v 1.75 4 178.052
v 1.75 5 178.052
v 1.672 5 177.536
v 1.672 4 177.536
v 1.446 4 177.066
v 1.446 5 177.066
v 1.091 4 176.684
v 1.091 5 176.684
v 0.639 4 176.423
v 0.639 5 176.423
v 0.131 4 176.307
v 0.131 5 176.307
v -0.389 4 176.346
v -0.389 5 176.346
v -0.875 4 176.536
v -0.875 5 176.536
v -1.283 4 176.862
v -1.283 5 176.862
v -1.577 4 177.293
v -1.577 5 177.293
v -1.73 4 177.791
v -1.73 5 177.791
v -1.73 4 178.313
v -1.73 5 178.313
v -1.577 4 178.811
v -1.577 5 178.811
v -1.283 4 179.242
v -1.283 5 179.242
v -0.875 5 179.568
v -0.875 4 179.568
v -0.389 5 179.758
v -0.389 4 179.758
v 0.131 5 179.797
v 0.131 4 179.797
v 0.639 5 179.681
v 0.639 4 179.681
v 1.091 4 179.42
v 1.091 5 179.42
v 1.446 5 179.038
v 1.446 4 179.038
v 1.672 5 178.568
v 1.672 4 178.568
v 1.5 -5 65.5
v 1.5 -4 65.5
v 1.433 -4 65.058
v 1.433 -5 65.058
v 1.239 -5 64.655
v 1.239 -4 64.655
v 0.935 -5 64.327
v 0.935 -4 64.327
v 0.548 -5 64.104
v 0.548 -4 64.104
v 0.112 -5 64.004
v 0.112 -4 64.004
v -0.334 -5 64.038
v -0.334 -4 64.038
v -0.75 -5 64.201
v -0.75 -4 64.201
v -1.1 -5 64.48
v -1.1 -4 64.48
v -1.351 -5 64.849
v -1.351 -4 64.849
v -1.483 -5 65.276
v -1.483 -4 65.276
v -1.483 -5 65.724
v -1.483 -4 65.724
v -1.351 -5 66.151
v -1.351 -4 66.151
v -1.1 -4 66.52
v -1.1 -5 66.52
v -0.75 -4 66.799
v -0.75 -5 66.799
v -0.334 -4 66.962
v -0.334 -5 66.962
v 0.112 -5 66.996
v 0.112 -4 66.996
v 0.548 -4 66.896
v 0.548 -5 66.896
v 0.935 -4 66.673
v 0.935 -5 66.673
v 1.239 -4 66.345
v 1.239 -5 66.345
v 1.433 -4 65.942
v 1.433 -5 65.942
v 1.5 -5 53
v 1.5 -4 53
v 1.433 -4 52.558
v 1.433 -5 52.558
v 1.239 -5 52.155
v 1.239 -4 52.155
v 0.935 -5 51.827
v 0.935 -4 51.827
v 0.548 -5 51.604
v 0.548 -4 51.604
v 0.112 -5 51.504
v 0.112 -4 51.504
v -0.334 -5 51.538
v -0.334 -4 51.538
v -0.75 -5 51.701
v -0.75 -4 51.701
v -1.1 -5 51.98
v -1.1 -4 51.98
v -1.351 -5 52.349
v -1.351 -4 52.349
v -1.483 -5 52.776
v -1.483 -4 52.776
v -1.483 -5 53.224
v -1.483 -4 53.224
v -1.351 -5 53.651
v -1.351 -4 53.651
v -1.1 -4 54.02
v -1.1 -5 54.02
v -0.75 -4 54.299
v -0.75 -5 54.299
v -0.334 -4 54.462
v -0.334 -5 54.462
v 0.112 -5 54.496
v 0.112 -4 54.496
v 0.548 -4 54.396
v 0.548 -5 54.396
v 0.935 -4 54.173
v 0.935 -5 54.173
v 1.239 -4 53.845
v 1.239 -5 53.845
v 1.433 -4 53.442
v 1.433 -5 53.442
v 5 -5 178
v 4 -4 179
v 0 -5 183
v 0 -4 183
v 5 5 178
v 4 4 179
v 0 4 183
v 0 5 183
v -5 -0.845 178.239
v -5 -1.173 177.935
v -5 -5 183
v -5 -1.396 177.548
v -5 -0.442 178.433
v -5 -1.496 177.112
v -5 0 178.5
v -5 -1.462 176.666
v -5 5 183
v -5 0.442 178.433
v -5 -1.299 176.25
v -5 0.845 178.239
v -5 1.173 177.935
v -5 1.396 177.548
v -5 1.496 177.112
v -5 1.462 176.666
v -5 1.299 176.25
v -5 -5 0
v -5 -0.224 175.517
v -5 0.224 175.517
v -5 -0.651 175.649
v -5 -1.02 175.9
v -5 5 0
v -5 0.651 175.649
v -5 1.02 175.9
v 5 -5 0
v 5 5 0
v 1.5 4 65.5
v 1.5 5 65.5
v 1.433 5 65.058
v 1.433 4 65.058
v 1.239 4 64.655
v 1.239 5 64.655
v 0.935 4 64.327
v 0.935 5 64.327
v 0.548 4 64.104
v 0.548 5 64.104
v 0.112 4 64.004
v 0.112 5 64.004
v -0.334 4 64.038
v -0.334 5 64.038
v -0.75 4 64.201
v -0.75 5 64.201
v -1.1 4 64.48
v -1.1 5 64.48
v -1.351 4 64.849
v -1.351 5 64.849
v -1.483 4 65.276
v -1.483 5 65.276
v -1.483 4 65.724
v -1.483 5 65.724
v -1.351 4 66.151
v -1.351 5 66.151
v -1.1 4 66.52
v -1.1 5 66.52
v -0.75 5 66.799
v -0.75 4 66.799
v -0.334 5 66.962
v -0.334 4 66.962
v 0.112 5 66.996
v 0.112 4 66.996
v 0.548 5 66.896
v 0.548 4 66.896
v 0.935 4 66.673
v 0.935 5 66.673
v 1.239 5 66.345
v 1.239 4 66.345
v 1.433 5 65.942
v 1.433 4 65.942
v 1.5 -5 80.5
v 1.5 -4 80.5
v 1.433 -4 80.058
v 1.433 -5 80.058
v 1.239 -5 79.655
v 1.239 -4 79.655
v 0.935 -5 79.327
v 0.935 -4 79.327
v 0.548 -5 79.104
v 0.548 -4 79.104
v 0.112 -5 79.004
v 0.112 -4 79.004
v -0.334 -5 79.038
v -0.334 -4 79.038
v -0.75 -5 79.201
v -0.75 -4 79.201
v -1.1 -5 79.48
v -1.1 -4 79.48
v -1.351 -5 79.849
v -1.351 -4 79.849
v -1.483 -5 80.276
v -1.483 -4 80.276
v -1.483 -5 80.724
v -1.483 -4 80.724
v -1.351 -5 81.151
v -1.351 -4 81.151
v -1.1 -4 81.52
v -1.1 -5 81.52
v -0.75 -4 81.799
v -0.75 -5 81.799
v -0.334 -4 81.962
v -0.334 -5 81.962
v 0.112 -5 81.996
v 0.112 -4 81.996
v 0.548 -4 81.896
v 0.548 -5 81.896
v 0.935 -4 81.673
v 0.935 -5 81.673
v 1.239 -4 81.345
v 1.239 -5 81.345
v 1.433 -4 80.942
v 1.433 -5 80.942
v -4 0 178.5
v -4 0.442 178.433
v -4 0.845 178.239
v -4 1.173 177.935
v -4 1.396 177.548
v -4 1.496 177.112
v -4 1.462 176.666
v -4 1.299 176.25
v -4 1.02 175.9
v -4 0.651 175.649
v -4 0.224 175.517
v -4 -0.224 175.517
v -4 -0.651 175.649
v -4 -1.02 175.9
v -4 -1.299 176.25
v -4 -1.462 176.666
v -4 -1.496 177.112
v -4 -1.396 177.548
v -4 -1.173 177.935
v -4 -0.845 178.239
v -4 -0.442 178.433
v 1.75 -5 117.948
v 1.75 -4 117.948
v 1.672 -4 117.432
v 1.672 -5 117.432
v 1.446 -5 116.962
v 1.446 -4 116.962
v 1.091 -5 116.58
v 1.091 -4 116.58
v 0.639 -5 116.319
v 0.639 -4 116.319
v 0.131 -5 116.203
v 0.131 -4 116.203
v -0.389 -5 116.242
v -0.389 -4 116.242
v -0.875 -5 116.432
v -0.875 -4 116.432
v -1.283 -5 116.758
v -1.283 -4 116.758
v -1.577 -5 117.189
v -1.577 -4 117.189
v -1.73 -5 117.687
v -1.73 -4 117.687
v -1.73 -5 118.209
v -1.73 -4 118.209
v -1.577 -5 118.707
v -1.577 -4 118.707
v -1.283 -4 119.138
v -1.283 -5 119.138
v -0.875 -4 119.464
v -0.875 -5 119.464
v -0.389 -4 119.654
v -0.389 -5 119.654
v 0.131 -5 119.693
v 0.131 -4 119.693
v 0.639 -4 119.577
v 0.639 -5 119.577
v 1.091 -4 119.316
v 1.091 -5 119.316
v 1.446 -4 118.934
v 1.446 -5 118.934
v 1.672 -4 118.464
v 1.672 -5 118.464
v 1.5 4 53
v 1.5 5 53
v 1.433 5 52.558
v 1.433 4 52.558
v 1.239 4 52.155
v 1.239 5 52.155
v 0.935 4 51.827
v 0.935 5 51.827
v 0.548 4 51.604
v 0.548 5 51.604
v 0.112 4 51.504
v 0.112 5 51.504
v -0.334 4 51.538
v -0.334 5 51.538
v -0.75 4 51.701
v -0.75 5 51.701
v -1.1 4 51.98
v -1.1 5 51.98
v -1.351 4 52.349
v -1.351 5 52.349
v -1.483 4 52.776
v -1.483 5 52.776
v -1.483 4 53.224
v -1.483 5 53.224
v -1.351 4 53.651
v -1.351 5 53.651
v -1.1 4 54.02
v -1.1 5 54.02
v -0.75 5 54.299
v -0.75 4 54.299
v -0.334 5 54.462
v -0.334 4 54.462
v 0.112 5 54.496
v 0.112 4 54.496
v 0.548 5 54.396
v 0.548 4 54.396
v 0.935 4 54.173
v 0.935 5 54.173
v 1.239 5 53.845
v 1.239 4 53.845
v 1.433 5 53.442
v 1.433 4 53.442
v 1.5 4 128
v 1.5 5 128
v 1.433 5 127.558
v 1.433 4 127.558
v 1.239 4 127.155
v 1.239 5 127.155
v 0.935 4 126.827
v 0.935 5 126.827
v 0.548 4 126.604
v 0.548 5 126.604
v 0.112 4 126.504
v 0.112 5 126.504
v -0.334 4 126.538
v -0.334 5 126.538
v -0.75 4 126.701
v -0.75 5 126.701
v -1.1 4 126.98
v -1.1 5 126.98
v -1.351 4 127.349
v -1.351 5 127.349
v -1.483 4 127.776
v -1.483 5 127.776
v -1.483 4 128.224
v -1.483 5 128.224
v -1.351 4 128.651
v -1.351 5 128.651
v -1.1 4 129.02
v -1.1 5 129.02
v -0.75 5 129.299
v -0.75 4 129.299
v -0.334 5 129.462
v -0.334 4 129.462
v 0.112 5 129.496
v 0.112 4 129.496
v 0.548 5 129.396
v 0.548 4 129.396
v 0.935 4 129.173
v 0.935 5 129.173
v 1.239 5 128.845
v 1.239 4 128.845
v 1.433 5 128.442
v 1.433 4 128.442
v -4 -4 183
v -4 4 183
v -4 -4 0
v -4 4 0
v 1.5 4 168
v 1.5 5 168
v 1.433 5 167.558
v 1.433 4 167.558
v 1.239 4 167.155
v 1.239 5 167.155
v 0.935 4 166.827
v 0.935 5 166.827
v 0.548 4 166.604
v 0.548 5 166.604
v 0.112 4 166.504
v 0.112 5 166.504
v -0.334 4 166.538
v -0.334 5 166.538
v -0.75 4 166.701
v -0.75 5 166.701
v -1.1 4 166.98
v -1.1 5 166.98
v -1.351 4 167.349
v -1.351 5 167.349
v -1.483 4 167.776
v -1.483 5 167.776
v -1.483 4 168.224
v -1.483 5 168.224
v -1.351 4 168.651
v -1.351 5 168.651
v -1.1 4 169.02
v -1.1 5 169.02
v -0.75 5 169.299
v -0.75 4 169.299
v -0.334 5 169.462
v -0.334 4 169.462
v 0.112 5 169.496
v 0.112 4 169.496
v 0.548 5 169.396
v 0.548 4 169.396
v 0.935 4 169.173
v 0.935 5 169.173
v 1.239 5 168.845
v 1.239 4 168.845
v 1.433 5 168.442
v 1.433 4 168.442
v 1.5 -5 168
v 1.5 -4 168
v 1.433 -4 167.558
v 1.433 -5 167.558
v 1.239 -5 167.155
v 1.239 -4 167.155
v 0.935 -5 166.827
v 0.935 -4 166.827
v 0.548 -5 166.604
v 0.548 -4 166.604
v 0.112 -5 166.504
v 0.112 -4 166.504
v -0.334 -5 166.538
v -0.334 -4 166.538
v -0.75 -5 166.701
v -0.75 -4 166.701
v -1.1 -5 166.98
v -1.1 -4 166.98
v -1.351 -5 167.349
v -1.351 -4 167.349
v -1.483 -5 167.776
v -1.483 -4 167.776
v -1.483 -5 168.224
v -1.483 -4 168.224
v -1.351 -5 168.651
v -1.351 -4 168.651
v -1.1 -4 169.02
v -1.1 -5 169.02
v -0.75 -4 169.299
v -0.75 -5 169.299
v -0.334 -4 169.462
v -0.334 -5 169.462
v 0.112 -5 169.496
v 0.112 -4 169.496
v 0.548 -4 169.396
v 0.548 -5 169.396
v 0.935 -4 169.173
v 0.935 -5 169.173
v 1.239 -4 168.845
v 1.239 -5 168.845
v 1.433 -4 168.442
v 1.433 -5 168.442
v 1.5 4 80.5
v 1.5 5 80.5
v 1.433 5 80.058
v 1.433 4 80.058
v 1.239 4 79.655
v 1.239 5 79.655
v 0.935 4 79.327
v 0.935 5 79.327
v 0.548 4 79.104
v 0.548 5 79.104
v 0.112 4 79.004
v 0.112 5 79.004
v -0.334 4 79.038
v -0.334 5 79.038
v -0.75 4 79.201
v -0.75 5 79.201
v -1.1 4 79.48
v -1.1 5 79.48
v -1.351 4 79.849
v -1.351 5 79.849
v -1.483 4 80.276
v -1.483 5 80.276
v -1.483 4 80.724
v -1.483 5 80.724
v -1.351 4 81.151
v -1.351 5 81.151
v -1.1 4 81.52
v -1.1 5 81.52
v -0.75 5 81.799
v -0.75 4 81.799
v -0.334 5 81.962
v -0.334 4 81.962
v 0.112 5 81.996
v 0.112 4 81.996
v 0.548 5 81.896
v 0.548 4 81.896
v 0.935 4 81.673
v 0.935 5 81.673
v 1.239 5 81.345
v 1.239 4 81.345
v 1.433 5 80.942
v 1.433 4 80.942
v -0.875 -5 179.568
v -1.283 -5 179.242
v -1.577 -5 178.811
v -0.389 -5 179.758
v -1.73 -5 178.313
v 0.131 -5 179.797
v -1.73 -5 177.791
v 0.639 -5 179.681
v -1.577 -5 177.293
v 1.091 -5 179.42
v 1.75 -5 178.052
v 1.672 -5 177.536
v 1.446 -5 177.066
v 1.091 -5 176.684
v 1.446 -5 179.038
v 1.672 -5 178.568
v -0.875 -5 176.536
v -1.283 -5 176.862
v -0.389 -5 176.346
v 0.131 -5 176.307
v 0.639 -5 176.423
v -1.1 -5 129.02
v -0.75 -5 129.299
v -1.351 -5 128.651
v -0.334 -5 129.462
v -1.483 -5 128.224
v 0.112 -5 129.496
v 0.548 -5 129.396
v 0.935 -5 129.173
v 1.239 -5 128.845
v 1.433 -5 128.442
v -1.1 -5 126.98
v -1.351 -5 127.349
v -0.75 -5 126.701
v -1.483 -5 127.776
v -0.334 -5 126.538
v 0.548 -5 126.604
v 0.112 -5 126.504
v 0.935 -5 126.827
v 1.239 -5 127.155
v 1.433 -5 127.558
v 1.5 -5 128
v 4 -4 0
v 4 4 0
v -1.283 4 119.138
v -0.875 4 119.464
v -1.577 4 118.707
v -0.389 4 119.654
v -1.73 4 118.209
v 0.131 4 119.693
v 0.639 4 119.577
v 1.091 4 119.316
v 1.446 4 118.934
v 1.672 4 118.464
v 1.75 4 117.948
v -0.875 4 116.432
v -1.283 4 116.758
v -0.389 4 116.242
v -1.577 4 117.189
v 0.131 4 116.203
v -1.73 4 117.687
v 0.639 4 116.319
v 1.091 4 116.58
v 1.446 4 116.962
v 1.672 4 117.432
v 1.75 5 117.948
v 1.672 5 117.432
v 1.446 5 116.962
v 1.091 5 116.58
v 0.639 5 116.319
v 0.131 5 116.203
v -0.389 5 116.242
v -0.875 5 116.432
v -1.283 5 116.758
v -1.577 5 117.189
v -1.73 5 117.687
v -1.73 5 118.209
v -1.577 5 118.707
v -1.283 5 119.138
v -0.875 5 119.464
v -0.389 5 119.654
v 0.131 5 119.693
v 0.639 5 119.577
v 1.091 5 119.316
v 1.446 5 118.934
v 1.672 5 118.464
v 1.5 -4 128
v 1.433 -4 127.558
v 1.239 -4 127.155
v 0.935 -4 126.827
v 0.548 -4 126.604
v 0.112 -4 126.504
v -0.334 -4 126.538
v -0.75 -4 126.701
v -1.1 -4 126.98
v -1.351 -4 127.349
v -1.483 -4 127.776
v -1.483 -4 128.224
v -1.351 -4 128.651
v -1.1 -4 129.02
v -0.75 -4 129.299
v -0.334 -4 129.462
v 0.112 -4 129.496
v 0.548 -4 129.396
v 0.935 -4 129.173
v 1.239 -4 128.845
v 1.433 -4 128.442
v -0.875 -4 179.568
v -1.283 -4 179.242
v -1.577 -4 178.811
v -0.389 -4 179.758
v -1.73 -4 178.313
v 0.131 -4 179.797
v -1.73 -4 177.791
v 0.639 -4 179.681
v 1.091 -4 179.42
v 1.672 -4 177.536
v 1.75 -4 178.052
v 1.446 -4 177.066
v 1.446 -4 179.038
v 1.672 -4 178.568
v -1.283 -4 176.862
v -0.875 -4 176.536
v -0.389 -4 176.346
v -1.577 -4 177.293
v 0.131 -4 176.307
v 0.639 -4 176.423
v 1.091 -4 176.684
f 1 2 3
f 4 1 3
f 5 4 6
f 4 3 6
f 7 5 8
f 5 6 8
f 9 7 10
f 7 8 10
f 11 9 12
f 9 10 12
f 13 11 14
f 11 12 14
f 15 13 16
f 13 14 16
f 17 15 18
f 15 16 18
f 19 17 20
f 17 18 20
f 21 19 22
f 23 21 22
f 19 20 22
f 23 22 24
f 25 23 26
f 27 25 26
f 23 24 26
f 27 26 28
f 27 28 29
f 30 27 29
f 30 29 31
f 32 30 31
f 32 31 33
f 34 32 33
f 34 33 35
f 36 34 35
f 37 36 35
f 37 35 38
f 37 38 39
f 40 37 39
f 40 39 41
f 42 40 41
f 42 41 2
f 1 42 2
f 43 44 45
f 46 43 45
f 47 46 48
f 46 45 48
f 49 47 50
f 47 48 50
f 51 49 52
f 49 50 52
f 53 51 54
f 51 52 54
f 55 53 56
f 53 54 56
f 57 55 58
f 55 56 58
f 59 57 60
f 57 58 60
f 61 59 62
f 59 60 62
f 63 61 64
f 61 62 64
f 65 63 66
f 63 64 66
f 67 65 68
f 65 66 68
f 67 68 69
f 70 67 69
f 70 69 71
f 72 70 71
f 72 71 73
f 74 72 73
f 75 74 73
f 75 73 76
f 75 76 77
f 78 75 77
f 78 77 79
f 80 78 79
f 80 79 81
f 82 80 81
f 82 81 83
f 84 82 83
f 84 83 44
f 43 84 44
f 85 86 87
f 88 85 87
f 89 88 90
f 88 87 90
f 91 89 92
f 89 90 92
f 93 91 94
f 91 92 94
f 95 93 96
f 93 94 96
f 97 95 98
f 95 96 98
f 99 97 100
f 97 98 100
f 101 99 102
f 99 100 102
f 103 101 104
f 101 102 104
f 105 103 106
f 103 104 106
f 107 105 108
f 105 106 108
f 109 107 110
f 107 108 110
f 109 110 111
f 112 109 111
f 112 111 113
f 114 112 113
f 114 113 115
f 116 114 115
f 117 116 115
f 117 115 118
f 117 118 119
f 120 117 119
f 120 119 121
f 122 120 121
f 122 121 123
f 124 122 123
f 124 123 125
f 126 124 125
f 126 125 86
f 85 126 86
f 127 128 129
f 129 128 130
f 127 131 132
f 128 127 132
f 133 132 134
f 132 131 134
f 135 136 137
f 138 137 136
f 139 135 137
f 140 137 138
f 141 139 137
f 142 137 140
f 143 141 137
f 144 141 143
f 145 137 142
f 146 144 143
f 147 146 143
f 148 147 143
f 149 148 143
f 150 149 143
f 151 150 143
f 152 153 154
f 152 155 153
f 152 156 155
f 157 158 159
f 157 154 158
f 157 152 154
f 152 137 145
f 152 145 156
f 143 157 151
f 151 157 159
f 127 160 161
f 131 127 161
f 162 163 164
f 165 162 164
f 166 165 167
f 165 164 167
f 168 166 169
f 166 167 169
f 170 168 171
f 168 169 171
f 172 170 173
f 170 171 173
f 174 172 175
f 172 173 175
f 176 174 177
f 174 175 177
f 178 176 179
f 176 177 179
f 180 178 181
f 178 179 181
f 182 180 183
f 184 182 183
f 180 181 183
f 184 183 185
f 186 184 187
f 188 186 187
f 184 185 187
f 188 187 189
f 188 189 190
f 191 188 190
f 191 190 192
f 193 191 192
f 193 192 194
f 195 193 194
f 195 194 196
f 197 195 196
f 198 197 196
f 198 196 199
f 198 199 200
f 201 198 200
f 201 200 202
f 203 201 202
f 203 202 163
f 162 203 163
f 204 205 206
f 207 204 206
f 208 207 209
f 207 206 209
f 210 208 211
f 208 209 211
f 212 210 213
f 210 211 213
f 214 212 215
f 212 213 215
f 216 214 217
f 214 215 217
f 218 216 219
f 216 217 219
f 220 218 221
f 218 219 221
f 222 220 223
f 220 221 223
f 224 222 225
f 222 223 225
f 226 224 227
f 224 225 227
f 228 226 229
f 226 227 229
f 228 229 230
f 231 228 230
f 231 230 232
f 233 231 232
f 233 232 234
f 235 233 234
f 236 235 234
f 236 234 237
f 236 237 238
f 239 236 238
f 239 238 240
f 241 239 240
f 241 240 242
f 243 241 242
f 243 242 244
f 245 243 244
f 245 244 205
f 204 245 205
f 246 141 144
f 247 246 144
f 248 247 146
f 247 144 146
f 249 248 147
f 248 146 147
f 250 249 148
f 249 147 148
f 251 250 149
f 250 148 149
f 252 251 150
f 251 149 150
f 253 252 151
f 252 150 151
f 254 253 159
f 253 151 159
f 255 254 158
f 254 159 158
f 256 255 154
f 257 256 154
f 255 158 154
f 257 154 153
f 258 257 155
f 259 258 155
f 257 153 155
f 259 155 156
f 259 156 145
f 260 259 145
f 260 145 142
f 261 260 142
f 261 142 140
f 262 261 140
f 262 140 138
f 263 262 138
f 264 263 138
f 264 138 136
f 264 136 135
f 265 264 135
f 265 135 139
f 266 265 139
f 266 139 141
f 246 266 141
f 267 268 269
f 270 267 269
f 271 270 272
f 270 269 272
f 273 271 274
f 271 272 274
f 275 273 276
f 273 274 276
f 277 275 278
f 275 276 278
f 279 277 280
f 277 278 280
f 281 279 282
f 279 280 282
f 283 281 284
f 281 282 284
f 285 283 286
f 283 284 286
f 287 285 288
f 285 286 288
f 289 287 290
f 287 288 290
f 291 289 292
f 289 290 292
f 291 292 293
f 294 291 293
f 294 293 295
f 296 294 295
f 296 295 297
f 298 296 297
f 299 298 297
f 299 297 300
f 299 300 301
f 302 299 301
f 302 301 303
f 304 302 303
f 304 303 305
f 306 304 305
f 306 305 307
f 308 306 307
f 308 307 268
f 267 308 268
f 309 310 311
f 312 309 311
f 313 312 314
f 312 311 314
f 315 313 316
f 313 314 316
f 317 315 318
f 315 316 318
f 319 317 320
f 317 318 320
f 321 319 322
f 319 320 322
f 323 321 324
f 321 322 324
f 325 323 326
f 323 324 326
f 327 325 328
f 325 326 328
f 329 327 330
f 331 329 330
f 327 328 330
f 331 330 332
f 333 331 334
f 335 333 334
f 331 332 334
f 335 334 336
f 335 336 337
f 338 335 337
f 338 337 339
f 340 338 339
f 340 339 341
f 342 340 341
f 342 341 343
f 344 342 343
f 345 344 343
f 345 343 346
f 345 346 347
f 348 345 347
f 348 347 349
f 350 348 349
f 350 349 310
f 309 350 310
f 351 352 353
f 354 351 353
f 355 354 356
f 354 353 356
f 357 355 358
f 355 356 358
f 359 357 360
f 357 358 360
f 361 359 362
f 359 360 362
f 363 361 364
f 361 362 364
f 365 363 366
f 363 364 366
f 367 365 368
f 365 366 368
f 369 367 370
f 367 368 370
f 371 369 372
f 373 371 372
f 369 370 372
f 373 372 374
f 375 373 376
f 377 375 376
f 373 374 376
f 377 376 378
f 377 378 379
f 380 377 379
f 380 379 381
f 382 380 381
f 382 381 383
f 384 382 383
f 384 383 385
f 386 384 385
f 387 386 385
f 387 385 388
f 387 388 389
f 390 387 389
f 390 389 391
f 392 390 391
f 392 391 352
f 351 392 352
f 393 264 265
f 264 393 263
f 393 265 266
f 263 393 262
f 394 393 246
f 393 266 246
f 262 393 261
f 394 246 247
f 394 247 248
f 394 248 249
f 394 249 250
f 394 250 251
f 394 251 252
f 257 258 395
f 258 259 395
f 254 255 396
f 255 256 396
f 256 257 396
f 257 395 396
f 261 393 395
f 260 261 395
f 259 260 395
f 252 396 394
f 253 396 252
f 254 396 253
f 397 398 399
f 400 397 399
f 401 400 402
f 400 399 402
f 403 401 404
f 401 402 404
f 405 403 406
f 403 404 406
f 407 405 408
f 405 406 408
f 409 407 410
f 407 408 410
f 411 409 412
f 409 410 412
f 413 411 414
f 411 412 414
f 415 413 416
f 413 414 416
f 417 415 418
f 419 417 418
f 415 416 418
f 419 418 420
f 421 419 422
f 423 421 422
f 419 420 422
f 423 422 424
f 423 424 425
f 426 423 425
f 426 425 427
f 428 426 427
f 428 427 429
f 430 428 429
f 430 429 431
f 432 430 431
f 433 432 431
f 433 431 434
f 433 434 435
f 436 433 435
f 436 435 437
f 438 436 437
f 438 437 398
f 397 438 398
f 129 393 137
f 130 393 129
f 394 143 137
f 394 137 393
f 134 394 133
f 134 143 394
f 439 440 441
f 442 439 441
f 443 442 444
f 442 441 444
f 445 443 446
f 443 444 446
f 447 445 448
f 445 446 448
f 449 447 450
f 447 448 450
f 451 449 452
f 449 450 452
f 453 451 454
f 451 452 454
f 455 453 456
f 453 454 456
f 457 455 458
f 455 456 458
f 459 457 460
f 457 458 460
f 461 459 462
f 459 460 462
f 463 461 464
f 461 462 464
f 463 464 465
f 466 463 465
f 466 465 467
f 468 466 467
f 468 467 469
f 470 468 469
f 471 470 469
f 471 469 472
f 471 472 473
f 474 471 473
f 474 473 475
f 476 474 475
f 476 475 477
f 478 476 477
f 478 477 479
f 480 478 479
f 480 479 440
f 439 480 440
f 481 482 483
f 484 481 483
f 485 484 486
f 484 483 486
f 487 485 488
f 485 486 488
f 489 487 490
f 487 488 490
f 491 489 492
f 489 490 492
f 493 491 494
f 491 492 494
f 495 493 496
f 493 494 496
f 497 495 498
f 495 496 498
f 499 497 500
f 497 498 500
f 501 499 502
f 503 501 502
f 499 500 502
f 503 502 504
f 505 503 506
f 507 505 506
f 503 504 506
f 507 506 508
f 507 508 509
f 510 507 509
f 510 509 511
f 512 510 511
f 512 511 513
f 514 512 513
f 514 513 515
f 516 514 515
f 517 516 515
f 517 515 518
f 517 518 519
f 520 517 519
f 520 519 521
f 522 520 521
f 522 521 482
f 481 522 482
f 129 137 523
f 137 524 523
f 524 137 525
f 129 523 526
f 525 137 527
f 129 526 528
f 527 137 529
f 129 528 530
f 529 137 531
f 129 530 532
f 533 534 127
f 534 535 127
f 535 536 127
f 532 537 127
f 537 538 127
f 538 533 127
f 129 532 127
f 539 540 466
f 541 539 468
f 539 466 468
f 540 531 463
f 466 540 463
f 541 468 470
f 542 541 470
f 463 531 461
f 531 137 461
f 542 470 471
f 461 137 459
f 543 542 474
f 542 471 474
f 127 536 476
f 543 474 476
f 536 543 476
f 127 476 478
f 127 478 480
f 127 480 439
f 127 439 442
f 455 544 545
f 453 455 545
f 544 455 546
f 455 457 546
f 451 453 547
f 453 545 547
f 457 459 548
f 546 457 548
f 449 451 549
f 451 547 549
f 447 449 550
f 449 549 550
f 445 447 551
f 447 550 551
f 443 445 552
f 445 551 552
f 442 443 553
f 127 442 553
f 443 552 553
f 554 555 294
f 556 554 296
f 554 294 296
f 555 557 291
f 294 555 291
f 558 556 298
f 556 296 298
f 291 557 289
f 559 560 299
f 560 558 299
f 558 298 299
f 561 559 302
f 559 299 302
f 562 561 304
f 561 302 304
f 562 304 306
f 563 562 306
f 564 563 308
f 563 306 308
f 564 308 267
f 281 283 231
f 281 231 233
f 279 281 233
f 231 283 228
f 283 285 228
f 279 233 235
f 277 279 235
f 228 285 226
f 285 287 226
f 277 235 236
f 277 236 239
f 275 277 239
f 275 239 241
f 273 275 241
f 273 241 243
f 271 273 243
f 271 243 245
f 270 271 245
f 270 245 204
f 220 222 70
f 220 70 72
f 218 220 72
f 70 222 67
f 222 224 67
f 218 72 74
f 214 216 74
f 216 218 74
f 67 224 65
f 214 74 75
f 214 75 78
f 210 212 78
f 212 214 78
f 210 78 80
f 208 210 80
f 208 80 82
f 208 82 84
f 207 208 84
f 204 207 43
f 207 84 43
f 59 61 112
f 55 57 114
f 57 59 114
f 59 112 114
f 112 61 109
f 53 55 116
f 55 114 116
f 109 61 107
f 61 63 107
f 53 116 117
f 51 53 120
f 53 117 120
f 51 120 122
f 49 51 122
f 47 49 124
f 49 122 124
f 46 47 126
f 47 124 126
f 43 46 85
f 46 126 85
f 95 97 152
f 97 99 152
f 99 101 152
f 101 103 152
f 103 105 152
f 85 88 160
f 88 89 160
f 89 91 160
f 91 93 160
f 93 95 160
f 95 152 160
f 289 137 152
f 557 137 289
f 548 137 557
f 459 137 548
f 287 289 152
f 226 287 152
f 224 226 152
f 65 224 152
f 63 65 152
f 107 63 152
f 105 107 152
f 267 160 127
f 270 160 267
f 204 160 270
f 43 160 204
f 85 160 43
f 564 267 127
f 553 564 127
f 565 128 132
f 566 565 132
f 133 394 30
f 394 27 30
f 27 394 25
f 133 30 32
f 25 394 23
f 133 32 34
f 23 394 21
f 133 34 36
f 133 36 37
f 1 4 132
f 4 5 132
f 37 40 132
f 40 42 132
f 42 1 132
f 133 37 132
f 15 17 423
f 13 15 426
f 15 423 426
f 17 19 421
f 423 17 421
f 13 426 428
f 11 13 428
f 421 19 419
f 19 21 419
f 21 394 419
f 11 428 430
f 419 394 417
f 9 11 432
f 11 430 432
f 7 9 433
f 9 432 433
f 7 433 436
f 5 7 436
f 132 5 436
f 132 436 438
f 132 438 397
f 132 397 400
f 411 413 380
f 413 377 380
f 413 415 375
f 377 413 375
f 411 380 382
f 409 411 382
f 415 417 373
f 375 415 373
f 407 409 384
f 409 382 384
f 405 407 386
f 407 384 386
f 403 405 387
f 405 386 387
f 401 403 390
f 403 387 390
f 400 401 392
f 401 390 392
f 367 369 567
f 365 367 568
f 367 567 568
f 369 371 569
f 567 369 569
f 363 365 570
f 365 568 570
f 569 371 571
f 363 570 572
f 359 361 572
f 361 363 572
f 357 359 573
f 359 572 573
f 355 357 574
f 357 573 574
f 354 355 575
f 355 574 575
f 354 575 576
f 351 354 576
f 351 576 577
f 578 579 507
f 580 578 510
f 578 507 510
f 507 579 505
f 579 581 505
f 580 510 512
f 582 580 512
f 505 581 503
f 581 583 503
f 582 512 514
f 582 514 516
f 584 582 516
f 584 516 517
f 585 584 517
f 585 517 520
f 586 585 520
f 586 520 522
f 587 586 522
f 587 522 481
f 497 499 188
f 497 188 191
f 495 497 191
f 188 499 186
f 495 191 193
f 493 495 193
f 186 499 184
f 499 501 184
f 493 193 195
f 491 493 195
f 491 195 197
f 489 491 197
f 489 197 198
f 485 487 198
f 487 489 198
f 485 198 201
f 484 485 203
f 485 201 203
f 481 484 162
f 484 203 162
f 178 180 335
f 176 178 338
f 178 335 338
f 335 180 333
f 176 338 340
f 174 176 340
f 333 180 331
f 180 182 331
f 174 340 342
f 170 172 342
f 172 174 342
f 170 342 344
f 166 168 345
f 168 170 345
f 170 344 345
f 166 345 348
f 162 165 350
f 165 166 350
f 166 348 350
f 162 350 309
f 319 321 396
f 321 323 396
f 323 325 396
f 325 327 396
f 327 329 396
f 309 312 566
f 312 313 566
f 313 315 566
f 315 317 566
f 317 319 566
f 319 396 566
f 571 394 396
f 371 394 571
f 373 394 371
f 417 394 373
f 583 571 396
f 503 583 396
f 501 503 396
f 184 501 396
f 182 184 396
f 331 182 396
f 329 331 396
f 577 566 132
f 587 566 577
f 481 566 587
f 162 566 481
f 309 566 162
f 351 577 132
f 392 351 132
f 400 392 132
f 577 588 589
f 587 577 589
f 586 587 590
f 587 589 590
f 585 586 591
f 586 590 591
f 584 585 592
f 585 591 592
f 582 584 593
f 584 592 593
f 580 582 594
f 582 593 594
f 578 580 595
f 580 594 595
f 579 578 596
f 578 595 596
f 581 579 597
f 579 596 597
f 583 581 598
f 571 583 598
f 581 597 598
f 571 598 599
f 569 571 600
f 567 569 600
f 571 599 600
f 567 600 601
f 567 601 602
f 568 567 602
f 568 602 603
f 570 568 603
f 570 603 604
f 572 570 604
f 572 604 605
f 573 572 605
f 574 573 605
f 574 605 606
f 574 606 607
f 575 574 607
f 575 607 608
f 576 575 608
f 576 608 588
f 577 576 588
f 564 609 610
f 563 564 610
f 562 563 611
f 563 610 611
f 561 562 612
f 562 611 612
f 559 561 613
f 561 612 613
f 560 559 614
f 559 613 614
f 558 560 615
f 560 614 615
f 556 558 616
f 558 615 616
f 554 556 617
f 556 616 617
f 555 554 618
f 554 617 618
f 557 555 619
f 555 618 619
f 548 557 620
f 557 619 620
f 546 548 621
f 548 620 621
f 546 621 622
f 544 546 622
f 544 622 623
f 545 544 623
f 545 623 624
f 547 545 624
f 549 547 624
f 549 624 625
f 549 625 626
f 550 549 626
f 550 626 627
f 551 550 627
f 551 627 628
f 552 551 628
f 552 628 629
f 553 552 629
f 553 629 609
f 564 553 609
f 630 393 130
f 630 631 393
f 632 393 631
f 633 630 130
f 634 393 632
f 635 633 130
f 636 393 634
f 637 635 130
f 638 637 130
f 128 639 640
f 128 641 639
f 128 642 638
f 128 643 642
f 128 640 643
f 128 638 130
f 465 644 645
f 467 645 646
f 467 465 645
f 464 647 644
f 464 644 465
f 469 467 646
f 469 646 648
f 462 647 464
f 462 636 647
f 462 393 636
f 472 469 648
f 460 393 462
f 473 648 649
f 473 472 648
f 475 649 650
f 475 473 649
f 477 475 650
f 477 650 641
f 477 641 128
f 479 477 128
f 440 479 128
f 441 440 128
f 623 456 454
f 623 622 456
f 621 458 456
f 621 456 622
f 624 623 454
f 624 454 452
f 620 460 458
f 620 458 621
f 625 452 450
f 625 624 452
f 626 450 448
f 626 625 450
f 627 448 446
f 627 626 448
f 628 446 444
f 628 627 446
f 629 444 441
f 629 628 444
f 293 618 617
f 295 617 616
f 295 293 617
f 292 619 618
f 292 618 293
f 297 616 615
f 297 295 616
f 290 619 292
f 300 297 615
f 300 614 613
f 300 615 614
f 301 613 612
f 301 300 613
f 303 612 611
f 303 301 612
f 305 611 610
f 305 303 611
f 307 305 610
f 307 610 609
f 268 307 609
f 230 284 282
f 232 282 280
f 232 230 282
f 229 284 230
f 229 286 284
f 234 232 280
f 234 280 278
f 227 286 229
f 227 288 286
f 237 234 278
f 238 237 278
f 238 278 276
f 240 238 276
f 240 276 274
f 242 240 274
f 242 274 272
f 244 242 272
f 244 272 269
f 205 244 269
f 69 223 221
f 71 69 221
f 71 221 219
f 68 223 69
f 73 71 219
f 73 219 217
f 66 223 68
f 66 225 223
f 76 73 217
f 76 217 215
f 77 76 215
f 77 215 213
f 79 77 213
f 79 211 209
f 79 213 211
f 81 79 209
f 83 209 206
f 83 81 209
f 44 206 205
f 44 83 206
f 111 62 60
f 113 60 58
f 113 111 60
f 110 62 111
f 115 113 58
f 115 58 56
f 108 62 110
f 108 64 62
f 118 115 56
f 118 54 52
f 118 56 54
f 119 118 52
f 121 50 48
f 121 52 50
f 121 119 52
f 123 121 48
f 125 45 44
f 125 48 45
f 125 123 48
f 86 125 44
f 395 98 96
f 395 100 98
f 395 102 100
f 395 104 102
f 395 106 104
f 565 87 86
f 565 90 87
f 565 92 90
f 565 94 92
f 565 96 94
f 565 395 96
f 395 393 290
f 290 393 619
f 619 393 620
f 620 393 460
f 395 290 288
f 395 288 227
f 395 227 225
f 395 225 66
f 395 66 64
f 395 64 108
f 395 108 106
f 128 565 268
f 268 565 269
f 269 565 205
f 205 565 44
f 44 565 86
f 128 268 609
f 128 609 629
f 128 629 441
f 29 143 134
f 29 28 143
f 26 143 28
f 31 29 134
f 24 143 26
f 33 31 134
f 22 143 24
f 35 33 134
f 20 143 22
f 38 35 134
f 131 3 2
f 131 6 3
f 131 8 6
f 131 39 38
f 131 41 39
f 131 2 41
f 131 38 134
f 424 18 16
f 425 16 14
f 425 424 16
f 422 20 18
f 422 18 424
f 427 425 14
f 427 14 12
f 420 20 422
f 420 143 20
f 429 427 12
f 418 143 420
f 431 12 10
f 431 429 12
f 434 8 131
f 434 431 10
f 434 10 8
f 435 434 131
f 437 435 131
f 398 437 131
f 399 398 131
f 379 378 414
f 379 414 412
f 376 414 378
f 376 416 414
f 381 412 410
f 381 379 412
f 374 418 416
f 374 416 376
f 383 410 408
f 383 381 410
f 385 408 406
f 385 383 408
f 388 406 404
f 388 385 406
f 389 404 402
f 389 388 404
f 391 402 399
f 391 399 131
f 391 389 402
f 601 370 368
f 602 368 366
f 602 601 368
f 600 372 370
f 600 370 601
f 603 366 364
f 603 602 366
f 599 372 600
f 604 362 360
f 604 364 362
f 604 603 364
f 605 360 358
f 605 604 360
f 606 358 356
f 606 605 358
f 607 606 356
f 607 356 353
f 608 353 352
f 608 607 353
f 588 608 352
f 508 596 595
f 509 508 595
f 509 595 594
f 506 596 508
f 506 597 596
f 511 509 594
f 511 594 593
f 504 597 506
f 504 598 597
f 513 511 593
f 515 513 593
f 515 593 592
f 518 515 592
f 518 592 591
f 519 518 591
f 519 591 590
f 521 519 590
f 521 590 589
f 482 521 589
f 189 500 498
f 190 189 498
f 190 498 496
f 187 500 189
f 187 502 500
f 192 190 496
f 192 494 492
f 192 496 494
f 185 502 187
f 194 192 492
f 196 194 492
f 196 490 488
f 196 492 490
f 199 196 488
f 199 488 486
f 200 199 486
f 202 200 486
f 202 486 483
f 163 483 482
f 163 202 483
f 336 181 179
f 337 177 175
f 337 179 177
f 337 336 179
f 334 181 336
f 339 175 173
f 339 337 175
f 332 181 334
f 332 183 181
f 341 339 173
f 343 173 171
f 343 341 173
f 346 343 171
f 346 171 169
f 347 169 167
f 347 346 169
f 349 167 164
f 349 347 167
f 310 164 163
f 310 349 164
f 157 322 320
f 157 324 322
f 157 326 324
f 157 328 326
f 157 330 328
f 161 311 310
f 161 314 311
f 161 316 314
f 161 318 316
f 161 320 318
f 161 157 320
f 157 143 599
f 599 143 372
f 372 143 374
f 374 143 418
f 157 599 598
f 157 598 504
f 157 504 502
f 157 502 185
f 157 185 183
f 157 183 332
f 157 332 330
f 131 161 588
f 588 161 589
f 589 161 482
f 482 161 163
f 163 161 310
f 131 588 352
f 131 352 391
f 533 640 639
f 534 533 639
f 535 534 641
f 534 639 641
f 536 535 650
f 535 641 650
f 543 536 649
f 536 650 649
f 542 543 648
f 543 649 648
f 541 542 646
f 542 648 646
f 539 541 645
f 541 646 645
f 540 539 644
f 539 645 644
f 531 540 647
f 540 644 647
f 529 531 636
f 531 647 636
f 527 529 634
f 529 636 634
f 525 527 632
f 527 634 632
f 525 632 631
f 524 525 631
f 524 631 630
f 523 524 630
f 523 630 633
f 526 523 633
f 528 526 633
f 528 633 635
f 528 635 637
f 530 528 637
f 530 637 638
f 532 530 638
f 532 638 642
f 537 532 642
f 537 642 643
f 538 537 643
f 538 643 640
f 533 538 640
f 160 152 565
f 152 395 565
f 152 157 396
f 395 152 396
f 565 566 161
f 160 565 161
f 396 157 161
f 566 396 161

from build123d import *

# Parameters (mm, degrees)
SKETCH_1_W          = 10
SKETCH_1_H          = 10
SKETCH_1_W_2        = 8
SKETCH_1_H_2        = 8
EXTRUDE_1_DEPTH     = 183
SKETCH_2_R          = 1.75
SKETCH_2_R_2        = 1.5
CUT_EXTRUDE_1_DEPTH = 11
SKETCH_4_R          = 1.5
CUT_EXTRUDE_2_DEPTH = 5


with BuildPart() as part:
    # 草图1 → 拉伸-薄壁1 (new body)
    with BuildSketch(Plane.XY):
        Rectangle(SKETCH_1_W, SKETCH_1_H)
        Rectangle(SKETCH_1_W_2, SKETCH_1_H_2, mode=Mode.SUBTRACT)
    extrude(amount=EXTRUDE_1_DEPTH)

    # 草图2 → 切除-拉伸1 (cut, through all)
    with BuildSketch(Plane(origin=(0, 5, 0), x_dir=(1, 0, 0), z_dir=(0, 1, 0))):
        Polygon((5, -183), (5, -178), (0, -183), align=None)
        with Locations((0, -178.0520382)):
            Circle(SKETCH_2_R)
        with Locations((0, -168)):
            Circle(SKETCH_2_R_2)
        with Locations((0, -128)):
            Circle(SKETCH_2_R_2)
        with Locations((0, -117.9479618)):
            Circle(SKETCH_2_R)
        with Locations((0, -80.5)):
            Circle(SKETCH_2_R_2)
        with Locations((0, -65.5)):
            Circle(SKETCH_2_R_2)
        with Locations((0, -53)):
            Circle(SKETCH_2_R_2)
    extrude(amount=-CUT_EXTRUDE_1_DEPTH, mode=Mode.SUBTRACT)

    # 草图4 → 切除-拉伸2 (cut)
    with BuildSketch(Plane.ZY.offset(5)):
        with Locations((177, 0)):
            Circle(SKETCH_4_R)
    extrude(amount=-CUT_EXTRUDE_2_DEPTH, mode=Mode.SUBTRACT)


solid = part.part
